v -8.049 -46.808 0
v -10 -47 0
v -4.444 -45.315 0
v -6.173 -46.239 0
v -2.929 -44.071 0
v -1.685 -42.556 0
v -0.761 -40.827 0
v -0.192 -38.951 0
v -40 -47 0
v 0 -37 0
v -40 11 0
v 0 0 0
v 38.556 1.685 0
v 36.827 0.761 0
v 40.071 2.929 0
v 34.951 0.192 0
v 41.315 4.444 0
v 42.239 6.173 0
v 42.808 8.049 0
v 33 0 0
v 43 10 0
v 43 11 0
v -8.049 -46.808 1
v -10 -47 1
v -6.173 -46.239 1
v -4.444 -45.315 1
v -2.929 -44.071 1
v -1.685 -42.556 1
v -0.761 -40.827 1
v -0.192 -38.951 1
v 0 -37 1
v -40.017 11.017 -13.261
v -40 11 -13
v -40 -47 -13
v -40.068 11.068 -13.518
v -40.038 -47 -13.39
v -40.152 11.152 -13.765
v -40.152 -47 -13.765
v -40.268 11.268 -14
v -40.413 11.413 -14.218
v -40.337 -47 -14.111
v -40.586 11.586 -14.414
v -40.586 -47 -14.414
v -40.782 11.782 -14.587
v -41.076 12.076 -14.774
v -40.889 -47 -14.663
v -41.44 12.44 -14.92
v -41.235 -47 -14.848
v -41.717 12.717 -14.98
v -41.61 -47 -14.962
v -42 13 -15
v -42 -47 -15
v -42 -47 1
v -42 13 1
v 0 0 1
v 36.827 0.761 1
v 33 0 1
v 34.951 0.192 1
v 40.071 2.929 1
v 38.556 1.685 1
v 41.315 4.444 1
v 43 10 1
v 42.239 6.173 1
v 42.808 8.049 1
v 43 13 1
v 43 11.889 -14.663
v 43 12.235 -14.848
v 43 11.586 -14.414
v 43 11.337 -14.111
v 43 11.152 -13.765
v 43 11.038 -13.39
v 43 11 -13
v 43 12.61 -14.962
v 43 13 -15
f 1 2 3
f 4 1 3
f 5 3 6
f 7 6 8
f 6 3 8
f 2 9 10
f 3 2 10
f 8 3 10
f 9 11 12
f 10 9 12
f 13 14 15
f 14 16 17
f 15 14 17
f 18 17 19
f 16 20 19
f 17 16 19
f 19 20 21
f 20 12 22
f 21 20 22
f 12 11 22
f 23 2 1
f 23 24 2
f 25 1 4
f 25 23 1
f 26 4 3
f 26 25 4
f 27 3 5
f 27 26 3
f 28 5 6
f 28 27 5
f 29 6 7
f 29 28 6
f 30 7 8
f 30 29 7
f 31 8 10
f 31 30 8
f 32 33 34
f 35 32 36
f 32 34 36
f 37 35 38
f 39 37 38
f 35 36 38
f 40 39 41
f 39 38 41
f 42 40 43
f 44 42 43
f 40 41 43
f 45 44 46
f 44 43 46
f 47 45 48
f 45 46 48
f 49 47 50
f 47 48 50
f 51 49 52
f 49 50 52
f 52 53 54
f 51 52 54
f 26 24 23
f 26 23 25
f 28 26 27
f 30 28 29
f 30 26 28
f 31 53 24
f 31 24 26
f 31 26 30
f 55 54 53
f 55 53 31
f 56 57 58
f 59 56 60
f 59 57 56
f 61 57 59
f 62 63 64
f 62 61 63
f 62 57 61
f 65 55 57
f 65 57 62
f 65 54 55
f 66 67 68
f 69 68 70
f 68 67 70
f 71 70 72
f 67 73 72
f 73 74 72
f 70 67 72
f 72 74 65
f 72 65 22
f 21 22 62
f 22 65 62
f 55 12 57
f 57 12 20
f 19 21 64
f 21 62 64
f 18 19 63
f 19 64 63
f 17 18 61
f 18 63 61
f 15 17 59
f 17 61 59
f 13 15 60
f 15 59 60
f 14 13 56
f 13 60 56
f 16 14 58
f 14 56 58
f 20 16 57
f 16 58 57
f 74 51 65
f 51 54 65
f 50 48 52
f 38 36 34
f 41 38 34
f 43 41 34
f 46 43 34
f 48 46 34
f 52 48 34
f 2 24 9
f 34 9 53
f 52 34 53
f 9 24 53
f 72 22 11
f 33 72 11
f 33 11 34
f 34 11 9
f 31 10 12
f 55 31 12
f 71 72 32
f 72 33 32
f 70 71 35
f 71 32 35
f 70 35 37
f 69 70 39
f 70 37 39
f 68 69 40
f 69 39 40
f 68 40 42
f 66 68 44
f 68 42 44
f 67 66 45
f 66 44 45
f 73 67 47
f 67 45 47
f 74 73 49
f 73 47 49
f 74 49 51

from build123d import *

# Parameters (mm, degrees)
F1_DEPTH = 1
F3_DEPTH = 15
F4_R     = 1.99999
F5_R     = 10


# Not quite as in the source:
# - a fillet or chamfer is up to 0.001 mm smaller than in the source, because OpenCascade refuses the exact size


with BuildPart() as f1:
    # F0 (on Top) → F1 (new body)
    with BuildSketch(Plane.XY):
        Polygon((-42, -47), (0, -47), (0, 0), (43, 0), (43, 13), (-42, 13), (-42, 0), align=None)
    extrude(amount=F1_DEPTH)

    # F2 (on face) → F3 (join)
    with BuildSketch(Plane(origin=(0, 0, 0), x_dir=(1, 0, 0), z_dir=(0, 0, -1))):
        Polygon((-42, 47), (-42, -13), (-40, -13), (43, -13), (43, -11), (-40, -11), (-40, 47), align=None)
    extrude(amount=F3_DEPTH)

    # F4 (radius 2 in the source; OpenCascade refuses exactly that, so slightly less here)
    f4_edges = [f1.edges().sort_by_distance(p)[0] for p in [
        (-40, -18, -15),
        (1.5, 11, -15),
    ]]
    fillet(f4_edges, radius=F4_R)

    # F5
    f5_edges = [f1.edges().sort_by_distance(p)[0] for p in [
        (0, -47, 0.5),
        (43, 0, 0.5),
    ]]
    fillet(f5_edges, radius=F5_R)


solid = f1.part
